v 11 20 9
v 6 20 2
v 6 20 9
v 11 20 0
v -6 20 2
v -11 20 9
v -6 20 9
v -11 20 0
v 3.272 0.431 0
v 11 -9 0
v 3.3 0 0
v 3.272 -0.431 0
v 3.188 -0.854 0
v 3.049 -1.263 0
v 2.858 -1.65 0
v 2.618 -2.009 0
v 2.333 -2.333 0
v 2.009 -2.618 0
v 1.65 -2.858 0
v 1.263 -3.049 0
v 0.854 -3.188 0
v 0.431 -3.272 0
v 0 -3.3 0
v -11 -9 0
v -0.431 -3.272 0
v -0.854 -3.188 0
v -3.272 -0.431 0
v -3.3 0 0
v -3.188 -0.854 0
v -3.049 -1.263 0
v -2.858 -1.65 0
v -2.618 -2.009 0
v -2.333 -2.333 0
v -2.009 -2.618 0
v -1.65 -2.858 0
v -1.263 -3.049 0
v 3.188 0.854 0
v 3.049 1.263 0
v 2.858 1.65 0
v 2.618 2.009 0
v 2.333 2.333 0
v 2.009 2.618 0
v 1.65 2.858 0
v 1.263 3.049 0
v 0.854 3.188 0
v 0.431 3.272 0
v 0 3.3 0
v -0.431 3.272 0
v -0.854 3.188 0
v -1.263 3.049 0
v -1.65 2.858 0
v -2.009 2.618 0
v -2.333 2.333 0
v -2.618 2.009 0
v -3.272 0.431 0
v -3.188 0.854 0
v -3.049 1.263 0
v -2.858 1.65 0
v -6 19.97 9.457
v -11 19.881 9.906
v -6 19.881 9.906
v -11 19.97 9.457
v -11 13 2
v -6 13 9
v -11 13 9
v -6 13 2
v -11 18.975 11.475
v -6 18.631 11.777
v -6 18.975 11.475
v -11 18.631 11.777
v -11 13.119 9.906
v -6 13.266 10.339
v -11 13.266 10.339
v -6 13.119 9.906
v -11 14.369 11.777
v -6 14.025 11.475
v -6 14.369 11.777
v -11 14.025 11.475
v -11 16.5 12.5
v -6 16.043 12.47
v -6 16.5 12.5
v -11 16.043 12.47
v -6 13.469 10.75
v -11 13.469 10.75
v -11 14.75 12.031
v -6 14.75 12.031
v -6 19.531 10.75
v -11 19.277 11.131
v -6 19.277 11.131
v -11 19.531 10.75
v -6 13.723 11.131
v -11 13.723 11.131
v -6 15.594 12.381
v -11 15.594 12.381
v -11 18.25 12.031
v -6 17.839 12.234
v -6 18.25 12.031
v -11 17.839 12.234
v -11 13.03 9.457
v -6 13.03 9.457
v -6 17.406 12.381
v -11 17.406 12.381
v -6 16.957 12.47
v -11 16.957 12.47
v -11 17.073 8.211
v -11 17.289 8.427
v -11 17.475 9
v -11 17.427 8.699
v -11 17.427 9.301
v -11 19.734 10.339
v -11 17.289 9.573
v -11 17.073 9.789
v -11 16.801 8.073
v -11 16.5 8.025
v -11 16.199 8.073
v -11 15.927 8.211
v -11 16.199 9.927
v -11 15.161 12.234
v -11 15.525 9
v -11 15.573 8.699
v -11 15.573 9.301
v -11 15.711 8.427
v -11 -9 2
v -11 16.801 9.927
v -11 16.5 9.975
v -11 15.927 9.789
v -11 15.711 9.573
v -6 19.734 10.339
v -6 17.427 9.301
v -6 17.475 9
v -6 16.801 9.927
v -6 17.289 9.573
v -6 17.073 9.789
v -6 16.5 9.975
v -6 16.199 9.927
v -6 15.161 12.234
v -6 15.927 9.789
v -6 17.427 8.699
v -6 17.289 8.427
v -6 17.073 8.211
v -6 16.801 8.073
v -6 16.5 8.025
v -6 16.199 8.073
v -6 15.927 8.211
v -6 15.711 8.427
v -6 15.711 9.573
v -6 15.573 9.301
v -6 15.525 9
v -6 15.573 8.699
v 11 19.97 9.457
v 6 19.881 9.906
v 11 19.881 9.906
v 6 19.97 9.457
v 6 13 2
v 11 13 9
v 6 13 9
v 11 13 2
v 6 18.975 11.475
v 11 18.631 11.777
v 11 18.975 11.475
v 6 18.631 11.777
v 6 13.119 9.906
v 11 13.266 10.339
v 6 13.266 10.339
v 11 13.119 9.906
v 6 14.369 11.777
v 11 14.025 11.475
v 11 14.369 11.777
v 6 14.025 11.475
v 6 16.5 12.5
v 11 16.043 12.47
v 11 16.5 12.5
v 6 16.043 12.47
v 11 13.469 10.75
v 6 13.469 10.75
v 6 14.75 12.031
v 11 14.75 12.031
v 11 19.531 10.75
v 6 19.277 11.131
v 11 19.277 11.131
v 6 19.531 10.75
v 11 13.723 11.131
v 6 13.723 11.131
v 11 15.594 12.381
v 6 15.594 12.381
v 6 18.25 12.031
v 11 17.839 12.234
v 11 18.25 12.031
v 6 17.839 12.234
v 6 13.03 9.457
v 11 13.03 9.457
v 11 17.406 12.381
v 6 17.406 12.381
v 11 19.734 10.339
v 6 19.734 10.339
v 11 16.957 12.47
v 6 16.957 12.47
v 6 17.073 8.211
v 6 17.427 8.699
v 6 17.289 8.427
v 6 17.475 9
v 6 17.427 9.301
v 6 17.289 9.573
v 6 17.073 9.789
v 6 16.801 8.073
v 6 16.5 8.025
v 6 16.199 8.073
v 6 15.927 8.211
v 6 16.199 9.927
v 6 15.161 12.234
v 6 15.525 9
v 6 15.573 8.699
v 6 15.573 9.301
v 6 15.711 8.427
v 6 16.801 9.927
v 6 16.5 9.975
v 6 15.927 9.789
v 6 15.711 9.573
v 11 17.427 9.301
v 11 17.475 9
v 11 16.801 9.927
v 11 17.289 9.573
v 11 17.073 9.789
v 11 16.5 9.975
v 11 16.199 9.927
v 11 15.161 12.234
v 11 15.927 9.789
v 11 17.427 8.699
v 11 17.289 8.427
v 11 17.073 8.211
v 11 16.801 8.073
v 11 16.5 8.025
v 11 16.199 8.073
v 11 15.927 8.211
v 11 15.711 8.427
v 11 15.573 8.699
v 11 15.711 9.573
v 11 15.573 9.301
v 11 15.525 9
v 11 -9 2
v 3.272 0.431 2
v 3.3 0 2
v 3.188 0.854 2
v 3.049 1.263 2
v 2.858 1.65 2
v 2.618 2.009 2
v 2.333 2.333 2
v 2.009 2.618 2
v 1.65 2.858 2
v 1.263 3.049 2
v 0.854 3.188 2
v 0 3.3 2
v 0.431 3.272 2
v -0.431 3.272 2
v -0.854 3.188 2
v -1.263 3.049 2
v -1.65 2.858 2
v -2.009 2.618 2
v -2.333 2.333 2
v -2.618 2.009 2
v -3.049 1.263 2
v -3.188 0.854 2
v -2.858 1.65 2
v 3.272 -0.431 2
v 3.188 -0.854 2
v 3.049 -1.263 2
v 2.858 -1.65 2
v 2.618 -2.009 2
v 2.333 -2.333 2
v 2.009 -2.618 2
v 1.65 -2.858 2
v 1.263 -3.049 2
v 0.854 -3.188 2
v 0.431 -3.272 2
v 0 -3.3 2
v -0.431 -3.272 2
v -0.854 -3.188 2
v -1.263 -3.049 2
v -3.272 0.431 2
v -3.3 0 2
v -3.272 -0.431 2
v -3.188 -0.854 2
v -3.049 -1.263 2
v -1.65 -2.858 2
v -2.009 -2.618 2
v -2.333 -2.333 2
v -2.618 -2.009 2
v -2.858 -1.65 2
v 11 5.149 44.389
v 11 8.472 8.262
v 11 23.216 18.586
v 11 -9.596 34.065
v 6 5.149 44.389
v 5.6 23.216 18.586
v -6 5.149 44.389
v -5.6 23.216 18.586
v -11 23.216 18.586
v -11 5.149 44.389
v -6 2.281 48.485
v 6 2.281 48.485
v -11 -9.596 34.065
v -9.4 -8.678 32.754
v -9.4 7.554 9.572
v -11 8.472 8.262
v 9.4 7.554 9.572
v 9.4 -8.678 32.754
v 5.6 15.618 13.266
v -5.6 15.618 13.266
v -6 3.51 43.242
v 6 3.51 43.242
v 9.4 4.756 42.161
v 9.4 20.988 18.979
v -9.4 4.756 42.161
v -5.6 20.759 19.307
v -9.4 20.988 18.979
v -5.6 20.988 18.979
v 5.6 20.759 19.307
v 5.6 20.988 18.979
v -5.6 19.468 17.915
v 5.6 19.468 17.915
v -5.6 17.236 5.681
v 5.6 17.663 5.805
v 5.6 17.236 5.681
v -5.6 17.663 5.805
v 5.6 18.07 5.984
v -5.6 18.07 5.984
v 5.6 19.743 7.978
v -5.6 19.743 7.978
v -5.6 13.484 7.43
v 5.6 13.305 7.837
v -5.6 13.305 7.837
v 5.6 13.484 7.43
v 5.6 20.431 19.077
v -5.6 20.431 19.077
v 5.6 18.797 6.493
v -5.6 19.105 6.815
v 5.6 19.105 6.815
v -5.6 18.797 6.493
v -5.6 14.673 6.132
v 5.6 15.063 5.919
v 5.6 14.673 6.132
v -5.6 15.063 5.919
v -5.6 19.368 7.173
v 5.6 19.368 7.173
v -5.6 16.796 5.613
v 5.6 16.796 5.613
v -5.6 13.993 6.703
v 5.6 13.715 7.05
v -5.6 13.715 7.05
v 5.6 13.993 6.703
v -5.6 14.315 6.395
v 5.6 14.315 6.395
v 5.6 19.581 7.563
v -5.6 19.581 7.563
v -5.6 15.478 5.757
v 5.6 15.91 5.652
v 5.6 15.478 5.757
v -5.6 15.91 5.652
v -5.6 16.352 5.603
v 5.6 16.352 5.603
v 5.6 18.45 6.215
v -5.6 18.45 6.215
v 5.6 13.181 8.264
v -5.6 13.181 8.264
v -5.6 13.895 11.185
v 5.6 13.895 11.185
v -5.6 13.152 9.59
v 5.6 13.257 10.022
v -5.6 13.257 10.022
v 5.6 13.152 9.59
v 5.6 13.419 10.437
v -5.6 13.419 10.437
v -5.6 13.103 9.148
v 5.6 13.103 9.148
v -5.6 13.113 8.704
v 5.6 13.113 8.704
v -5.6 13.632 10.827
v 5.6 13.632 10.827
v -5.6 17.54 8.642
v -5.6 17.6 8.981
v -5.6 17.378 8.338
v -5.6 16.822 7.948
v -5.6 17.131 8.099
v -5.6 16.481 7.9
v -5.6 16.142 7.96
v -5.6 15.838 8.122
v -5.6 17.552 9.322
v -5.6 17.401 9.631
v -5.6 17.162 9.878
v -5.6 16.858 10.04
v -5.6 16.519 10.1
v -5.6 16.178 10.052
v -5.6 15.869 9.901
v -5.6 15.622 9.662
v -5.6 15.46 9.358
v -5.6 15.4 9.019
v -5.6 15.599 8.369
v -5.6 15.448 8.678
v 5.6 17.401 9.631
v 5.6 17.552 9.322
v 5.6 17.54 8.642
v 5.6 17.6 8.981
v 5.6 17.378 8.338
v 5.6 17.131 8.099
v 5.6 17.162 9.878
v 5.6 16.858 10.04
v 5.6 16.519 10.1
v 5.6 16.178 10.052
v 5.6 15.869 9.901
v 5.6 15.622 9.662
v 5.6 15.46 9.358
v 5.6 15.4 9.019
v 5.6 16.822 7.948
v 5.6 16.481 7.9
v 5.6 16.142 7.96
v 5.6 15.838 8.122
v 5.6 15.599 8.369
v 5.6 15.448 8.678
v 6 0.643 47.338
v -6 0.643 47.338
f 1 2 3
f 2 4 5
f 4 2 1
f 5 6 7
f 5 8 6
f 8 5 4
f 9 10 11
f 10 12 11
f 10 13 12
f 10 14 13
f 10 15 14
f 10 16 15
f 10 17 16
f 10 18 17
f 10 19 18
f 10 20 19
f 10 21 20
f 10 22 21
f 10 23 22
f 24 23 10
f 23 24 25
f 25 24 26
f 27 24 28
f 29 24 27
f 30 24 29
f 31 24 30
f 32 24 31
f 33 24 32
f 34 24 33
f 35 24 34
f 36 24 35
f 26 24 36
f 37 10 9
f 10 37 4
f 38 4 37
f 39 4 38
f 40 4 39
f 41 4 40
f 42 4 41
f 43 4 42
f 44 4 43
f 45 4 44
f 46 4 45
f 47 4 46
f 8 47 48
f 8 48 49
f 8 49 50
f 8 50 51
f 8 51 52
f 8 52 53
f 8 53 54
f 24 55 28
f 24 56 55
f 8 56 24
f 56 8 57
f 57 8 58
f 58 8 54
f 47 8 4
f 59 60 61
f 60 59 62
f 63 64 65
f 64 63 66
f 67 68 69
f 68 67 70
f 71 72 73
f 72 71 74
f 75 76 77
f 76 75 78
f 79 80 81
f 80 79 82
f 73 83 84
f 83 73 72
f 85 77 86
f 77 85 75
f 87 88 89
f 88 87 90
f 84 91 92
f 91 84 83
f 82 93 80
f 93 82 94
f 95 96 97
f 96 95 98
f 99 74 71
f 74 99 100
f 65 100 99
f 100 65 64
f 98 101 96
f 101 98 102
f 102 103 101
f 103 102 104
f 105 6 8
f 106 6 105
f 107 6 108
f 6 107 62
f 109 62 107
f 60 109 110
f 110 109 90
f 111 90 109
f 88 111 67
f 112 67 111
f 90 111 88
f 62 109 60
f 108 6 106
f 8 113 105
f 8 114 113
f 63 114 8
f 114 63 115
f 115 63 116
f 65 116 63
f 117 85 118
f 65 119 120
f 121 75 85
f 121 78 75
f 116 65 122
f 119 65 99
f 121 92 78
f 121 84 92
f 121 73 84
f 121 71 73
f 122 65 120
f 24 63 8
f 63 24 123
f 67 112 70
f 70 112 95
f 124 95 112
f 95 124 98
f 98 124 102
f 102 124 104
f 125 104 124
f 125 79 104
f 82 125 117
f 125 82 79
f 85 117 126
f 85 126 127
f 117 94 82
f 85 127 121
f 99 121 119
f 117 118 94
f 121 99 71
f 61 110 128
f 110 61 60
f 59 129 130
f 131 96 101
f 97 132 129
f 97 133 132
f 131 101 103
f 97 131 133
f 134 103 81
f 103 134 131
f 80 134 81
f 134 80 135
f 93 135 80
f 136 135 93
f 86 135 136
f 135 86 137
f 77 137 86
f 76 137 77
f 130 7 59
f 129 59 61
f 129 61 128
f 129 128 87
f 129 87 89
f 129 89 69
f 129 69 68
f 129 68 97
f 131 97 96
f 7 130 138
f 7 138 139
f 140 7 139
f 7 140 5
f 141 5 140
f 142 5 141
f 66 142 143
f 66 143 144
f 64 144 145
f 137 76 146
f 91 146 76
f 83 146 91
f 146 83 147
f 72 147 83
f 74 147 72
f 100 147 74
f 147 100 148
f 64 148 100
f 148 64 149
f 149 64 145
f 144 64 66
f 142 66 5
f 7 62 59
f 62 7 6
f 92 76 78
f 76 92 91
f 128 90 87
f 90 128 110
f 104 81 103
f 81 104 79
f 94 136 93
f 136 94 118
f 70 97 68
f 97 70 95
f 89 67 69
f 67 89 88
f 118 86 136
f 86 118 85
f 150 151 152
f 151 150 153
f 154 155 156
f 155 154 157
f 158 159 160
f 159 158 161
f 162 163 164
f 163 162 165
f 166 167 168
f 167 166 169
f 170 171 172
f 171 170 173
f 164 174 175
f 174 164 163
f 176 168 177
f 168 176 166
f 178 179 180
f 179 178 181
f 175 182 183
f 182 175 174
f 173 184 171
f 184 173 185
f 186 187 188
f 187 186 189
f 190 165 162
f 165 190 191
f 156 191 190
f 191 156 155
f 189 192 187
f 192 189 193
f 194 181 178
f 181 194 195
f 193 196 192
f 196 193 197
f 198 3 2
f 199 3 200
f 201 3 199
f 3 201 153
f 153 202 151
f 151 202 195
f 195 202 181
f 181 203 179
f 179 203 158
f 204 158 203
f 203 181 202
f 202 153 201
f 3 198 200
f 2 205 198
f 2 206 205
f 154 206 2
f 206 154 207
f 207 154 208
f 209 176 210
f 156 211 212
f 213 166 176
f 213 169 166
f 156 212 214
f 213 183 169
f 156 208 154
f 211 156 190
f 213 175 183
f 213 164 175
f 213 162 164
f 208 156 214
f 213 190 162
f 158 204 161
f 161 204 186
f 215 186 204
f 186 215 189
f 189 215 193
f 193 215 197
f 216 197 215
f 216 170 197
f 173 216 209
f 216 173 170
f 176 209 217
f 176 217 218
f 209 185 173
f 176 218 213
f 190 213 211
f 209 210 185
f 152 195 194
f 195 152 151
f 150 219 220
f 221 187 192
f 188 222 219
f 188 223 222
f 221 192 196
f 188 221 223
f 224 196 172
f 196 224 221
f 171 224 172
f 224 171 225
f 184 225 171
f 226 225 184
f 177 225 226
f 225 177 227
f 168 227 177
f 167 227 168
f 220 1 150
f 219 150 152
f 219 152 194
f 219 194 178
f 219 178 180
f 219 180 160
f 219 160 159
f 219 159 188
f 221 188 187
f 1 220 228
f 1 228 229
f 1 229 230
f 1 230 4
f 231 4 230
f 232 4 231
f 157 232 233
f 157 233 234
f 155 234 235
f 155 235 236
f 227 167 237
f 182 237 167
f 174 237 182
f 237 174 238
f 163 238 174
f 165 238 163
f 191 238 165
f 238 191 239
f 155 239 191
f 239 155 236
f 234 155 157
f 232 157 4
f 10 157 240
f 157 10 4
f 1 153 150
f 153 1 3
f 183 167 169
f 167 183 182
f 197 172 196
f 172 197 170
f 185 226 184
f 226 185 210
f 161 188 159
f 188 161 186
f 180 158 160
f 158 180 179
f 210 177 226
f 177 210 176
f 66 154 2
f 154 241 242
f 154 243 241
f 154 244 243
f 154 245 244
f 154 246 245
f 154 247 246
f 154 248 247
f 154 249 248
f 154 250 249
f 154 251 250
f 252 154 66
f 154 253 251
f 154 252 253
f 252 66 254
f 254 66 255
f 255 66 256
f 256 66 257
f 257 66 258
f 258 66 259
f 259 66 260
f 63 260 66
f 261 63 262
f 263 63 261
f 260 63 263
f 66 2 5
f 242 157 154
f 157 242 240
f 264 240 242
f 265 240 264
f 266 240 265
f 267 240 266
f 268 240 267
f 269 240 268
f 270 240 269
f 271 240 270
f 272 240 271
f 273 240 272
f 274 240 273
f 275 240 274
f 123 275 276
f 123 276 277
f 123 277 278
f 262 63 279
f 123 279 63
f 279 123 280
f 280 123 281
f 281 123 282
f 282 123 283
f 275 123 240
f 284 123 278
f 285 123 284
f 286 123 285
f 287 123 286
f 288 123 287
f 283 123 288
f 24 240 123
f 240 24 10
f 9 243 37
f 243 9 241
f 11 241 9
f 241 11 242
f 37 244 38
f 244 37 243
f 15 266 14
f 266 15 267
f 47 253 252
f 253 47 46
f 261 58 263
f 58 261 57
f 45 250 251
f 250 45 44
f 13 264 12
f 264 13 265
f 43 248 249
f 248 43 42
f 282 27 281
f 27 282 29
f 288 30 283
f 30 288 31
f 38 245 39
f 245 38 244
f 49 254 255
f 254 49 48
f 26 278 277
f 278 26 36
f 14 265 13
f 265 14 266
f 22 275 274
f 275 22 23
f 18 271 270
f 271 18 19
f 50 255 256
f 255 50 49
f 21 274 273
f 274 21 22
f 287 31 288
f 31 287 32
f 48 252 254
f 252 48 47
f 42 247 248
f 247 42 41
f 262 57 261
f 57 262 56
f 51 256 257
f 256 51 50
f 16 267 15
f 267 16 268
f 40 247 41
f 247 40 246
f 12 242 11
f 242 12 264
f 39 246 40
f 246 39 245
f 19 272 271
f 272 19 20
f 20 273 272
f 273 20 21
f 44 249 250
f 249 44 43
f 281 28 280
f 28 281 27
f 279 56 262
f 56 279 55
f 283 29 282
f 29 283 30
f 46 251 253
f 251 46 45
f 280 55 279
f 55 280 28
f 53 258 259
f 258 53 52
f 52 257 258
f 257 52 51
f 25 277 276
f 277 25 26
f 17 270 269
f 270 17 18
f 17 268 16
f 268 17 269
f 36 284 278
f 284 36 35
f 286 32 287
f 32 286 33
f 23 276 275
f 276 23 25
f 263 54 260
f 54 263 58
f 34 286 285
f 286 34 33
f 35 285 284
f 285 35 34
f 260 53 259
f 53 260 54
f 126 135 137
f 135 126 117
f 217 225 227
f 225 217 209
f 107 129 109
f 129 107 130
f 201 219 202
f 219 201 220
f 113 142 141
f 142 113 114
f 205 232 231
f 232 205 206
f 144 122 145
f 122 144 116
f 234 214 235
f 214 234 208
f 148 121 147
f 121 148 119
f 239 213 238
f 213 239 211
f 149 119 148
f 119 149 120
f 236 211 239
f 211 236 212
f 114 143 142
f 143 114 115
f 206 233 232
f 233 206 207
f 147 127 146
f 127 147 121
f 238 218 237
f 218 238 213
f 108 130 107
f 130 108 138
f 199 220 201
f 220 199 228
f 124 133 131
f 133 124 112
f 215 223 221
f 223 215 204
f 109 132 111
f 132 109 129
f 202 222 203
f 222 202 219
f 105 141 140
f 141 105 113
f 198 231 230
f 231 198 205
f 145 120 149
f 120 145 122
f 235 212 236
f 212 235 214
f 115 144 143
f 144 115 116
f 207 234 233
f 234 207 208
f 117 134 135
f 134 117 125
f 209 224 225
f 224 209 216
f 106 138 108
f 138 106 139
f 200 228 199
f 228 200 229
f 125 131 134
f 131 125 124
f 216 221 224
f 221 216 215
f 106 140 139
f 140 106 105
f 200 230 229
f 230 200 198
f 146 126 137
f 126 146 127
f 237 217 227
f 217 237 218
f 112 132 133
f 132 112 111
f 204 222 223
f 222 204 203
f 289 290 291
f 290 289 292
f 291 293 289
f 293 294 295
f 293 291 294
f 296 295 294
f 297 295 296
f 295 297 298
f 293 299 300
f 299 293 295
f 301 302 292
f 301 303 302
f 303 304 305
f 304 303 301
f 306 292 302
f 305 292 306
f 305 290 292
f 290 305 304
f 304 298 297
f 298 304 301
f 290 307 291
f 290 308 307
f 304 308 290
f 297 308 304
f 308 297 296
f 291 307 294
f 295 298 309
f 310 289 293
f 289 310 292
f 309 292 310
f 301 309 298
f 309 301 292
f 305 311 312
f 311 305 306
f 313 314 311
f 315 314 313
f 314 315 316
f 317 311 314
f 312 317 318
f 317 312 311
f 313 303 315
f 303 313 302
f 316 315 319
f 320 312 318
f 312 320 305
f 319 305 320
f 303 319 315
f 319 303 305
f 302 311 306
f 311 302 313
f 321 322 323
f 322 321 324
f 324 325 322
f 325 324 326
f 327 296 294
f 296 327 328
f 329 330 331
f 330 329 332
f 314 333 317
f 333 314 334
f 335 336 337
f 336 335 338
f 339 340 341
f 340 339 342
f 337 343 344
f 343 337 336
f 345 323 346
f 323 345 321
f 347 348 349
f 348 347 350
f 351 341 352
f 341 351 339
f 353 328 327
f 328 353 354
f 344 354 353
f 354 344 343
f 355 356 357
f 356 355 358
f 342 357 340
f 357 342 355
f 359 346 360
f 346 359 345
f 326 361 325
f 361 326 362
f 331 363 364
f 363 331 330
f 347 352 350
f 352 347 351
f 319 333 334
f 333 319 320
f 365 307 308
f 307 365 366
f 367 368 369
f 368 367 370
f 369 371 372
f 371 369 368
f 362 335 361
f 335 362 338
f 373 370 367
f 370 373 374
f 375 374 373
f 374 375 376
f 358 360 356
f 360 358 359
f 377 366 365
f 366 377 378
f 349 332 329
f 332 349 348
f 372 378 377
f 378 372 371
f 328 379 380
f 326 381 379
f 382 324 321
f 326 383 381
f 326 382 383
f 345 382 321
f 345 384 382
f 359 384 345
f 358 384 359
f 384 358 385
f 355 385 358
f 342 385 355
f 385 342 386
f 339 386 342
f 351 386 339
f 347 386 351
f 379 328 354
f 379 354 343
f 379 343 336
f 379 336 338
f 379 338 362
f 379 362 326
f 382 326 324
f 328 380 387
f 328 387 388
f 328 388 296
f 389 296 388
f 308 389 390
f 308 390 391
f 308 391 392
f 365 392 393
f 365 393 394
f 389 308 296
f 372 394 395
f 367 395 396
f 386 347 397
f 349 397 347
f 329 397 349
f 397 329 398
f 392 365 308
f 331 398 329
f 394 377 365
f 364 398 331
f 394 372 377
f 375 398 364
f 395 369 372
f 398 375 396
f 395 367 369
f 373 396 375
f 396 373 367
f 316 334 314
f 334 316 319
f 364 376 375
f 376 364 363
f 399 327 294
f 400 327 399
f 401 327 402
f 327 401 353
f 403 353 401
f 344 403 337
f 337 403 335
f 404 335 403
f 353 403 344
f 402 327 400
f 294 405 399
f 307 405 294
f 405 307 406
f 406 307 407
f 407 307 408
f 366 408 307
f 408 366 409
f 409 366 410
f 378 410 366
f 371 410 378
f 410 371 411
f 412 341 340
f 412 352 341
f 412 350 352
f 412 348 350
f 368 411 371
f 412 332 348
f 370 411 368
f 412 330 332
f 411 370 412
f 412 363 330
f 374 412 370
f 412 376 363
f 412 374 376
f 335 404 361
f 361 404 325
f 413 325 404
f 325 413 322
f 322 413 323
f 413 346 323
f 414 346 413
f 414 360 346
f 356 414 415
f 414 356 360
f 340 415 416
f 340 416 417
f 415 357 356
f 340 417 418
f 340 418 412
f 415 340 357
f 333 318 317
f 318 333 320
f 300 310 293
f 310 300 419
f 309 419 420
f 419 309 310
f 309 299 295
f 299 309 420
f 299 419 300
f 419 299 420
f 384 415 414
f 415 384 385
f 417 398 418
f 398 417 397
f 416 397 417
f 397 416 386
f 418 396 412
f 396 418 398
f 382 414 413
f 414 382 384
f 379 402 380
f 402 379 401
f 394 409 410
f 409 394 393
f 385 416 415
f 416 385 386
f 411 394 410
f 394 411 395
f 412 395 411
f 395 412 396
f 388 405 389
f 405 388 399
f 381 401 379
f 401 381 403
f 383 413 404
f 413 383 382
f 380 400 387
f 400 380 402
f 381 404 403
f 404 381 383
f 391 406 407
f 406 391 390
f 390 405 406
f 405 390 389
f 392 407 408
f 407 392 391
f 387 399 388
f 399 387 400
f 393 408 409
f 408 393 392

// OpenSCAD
// Missile-switch guard for a 6 mm mini toggle.  Print 1 base + 1 lid per guard
// (lid in red!).  Hinge pin: 24 mm of 1.75 mm filament, ends melted, or a 2 mm steel pin.
// The base slips over the toggle bushing and is clamped by the toggle's front nut.
include <../lib/ff_lib.scad>
PART = "preview";   // base | lid | preview
if (PART == "base") ff_guard_base();
else if (PART == "lid") translate([0, 0, FFG_H]) rotate([180, 0, 0]) ff_guard_lid(0);
else { color("#444") ff_guard_base(); color("#c00") ff_guard_lid(55); }
